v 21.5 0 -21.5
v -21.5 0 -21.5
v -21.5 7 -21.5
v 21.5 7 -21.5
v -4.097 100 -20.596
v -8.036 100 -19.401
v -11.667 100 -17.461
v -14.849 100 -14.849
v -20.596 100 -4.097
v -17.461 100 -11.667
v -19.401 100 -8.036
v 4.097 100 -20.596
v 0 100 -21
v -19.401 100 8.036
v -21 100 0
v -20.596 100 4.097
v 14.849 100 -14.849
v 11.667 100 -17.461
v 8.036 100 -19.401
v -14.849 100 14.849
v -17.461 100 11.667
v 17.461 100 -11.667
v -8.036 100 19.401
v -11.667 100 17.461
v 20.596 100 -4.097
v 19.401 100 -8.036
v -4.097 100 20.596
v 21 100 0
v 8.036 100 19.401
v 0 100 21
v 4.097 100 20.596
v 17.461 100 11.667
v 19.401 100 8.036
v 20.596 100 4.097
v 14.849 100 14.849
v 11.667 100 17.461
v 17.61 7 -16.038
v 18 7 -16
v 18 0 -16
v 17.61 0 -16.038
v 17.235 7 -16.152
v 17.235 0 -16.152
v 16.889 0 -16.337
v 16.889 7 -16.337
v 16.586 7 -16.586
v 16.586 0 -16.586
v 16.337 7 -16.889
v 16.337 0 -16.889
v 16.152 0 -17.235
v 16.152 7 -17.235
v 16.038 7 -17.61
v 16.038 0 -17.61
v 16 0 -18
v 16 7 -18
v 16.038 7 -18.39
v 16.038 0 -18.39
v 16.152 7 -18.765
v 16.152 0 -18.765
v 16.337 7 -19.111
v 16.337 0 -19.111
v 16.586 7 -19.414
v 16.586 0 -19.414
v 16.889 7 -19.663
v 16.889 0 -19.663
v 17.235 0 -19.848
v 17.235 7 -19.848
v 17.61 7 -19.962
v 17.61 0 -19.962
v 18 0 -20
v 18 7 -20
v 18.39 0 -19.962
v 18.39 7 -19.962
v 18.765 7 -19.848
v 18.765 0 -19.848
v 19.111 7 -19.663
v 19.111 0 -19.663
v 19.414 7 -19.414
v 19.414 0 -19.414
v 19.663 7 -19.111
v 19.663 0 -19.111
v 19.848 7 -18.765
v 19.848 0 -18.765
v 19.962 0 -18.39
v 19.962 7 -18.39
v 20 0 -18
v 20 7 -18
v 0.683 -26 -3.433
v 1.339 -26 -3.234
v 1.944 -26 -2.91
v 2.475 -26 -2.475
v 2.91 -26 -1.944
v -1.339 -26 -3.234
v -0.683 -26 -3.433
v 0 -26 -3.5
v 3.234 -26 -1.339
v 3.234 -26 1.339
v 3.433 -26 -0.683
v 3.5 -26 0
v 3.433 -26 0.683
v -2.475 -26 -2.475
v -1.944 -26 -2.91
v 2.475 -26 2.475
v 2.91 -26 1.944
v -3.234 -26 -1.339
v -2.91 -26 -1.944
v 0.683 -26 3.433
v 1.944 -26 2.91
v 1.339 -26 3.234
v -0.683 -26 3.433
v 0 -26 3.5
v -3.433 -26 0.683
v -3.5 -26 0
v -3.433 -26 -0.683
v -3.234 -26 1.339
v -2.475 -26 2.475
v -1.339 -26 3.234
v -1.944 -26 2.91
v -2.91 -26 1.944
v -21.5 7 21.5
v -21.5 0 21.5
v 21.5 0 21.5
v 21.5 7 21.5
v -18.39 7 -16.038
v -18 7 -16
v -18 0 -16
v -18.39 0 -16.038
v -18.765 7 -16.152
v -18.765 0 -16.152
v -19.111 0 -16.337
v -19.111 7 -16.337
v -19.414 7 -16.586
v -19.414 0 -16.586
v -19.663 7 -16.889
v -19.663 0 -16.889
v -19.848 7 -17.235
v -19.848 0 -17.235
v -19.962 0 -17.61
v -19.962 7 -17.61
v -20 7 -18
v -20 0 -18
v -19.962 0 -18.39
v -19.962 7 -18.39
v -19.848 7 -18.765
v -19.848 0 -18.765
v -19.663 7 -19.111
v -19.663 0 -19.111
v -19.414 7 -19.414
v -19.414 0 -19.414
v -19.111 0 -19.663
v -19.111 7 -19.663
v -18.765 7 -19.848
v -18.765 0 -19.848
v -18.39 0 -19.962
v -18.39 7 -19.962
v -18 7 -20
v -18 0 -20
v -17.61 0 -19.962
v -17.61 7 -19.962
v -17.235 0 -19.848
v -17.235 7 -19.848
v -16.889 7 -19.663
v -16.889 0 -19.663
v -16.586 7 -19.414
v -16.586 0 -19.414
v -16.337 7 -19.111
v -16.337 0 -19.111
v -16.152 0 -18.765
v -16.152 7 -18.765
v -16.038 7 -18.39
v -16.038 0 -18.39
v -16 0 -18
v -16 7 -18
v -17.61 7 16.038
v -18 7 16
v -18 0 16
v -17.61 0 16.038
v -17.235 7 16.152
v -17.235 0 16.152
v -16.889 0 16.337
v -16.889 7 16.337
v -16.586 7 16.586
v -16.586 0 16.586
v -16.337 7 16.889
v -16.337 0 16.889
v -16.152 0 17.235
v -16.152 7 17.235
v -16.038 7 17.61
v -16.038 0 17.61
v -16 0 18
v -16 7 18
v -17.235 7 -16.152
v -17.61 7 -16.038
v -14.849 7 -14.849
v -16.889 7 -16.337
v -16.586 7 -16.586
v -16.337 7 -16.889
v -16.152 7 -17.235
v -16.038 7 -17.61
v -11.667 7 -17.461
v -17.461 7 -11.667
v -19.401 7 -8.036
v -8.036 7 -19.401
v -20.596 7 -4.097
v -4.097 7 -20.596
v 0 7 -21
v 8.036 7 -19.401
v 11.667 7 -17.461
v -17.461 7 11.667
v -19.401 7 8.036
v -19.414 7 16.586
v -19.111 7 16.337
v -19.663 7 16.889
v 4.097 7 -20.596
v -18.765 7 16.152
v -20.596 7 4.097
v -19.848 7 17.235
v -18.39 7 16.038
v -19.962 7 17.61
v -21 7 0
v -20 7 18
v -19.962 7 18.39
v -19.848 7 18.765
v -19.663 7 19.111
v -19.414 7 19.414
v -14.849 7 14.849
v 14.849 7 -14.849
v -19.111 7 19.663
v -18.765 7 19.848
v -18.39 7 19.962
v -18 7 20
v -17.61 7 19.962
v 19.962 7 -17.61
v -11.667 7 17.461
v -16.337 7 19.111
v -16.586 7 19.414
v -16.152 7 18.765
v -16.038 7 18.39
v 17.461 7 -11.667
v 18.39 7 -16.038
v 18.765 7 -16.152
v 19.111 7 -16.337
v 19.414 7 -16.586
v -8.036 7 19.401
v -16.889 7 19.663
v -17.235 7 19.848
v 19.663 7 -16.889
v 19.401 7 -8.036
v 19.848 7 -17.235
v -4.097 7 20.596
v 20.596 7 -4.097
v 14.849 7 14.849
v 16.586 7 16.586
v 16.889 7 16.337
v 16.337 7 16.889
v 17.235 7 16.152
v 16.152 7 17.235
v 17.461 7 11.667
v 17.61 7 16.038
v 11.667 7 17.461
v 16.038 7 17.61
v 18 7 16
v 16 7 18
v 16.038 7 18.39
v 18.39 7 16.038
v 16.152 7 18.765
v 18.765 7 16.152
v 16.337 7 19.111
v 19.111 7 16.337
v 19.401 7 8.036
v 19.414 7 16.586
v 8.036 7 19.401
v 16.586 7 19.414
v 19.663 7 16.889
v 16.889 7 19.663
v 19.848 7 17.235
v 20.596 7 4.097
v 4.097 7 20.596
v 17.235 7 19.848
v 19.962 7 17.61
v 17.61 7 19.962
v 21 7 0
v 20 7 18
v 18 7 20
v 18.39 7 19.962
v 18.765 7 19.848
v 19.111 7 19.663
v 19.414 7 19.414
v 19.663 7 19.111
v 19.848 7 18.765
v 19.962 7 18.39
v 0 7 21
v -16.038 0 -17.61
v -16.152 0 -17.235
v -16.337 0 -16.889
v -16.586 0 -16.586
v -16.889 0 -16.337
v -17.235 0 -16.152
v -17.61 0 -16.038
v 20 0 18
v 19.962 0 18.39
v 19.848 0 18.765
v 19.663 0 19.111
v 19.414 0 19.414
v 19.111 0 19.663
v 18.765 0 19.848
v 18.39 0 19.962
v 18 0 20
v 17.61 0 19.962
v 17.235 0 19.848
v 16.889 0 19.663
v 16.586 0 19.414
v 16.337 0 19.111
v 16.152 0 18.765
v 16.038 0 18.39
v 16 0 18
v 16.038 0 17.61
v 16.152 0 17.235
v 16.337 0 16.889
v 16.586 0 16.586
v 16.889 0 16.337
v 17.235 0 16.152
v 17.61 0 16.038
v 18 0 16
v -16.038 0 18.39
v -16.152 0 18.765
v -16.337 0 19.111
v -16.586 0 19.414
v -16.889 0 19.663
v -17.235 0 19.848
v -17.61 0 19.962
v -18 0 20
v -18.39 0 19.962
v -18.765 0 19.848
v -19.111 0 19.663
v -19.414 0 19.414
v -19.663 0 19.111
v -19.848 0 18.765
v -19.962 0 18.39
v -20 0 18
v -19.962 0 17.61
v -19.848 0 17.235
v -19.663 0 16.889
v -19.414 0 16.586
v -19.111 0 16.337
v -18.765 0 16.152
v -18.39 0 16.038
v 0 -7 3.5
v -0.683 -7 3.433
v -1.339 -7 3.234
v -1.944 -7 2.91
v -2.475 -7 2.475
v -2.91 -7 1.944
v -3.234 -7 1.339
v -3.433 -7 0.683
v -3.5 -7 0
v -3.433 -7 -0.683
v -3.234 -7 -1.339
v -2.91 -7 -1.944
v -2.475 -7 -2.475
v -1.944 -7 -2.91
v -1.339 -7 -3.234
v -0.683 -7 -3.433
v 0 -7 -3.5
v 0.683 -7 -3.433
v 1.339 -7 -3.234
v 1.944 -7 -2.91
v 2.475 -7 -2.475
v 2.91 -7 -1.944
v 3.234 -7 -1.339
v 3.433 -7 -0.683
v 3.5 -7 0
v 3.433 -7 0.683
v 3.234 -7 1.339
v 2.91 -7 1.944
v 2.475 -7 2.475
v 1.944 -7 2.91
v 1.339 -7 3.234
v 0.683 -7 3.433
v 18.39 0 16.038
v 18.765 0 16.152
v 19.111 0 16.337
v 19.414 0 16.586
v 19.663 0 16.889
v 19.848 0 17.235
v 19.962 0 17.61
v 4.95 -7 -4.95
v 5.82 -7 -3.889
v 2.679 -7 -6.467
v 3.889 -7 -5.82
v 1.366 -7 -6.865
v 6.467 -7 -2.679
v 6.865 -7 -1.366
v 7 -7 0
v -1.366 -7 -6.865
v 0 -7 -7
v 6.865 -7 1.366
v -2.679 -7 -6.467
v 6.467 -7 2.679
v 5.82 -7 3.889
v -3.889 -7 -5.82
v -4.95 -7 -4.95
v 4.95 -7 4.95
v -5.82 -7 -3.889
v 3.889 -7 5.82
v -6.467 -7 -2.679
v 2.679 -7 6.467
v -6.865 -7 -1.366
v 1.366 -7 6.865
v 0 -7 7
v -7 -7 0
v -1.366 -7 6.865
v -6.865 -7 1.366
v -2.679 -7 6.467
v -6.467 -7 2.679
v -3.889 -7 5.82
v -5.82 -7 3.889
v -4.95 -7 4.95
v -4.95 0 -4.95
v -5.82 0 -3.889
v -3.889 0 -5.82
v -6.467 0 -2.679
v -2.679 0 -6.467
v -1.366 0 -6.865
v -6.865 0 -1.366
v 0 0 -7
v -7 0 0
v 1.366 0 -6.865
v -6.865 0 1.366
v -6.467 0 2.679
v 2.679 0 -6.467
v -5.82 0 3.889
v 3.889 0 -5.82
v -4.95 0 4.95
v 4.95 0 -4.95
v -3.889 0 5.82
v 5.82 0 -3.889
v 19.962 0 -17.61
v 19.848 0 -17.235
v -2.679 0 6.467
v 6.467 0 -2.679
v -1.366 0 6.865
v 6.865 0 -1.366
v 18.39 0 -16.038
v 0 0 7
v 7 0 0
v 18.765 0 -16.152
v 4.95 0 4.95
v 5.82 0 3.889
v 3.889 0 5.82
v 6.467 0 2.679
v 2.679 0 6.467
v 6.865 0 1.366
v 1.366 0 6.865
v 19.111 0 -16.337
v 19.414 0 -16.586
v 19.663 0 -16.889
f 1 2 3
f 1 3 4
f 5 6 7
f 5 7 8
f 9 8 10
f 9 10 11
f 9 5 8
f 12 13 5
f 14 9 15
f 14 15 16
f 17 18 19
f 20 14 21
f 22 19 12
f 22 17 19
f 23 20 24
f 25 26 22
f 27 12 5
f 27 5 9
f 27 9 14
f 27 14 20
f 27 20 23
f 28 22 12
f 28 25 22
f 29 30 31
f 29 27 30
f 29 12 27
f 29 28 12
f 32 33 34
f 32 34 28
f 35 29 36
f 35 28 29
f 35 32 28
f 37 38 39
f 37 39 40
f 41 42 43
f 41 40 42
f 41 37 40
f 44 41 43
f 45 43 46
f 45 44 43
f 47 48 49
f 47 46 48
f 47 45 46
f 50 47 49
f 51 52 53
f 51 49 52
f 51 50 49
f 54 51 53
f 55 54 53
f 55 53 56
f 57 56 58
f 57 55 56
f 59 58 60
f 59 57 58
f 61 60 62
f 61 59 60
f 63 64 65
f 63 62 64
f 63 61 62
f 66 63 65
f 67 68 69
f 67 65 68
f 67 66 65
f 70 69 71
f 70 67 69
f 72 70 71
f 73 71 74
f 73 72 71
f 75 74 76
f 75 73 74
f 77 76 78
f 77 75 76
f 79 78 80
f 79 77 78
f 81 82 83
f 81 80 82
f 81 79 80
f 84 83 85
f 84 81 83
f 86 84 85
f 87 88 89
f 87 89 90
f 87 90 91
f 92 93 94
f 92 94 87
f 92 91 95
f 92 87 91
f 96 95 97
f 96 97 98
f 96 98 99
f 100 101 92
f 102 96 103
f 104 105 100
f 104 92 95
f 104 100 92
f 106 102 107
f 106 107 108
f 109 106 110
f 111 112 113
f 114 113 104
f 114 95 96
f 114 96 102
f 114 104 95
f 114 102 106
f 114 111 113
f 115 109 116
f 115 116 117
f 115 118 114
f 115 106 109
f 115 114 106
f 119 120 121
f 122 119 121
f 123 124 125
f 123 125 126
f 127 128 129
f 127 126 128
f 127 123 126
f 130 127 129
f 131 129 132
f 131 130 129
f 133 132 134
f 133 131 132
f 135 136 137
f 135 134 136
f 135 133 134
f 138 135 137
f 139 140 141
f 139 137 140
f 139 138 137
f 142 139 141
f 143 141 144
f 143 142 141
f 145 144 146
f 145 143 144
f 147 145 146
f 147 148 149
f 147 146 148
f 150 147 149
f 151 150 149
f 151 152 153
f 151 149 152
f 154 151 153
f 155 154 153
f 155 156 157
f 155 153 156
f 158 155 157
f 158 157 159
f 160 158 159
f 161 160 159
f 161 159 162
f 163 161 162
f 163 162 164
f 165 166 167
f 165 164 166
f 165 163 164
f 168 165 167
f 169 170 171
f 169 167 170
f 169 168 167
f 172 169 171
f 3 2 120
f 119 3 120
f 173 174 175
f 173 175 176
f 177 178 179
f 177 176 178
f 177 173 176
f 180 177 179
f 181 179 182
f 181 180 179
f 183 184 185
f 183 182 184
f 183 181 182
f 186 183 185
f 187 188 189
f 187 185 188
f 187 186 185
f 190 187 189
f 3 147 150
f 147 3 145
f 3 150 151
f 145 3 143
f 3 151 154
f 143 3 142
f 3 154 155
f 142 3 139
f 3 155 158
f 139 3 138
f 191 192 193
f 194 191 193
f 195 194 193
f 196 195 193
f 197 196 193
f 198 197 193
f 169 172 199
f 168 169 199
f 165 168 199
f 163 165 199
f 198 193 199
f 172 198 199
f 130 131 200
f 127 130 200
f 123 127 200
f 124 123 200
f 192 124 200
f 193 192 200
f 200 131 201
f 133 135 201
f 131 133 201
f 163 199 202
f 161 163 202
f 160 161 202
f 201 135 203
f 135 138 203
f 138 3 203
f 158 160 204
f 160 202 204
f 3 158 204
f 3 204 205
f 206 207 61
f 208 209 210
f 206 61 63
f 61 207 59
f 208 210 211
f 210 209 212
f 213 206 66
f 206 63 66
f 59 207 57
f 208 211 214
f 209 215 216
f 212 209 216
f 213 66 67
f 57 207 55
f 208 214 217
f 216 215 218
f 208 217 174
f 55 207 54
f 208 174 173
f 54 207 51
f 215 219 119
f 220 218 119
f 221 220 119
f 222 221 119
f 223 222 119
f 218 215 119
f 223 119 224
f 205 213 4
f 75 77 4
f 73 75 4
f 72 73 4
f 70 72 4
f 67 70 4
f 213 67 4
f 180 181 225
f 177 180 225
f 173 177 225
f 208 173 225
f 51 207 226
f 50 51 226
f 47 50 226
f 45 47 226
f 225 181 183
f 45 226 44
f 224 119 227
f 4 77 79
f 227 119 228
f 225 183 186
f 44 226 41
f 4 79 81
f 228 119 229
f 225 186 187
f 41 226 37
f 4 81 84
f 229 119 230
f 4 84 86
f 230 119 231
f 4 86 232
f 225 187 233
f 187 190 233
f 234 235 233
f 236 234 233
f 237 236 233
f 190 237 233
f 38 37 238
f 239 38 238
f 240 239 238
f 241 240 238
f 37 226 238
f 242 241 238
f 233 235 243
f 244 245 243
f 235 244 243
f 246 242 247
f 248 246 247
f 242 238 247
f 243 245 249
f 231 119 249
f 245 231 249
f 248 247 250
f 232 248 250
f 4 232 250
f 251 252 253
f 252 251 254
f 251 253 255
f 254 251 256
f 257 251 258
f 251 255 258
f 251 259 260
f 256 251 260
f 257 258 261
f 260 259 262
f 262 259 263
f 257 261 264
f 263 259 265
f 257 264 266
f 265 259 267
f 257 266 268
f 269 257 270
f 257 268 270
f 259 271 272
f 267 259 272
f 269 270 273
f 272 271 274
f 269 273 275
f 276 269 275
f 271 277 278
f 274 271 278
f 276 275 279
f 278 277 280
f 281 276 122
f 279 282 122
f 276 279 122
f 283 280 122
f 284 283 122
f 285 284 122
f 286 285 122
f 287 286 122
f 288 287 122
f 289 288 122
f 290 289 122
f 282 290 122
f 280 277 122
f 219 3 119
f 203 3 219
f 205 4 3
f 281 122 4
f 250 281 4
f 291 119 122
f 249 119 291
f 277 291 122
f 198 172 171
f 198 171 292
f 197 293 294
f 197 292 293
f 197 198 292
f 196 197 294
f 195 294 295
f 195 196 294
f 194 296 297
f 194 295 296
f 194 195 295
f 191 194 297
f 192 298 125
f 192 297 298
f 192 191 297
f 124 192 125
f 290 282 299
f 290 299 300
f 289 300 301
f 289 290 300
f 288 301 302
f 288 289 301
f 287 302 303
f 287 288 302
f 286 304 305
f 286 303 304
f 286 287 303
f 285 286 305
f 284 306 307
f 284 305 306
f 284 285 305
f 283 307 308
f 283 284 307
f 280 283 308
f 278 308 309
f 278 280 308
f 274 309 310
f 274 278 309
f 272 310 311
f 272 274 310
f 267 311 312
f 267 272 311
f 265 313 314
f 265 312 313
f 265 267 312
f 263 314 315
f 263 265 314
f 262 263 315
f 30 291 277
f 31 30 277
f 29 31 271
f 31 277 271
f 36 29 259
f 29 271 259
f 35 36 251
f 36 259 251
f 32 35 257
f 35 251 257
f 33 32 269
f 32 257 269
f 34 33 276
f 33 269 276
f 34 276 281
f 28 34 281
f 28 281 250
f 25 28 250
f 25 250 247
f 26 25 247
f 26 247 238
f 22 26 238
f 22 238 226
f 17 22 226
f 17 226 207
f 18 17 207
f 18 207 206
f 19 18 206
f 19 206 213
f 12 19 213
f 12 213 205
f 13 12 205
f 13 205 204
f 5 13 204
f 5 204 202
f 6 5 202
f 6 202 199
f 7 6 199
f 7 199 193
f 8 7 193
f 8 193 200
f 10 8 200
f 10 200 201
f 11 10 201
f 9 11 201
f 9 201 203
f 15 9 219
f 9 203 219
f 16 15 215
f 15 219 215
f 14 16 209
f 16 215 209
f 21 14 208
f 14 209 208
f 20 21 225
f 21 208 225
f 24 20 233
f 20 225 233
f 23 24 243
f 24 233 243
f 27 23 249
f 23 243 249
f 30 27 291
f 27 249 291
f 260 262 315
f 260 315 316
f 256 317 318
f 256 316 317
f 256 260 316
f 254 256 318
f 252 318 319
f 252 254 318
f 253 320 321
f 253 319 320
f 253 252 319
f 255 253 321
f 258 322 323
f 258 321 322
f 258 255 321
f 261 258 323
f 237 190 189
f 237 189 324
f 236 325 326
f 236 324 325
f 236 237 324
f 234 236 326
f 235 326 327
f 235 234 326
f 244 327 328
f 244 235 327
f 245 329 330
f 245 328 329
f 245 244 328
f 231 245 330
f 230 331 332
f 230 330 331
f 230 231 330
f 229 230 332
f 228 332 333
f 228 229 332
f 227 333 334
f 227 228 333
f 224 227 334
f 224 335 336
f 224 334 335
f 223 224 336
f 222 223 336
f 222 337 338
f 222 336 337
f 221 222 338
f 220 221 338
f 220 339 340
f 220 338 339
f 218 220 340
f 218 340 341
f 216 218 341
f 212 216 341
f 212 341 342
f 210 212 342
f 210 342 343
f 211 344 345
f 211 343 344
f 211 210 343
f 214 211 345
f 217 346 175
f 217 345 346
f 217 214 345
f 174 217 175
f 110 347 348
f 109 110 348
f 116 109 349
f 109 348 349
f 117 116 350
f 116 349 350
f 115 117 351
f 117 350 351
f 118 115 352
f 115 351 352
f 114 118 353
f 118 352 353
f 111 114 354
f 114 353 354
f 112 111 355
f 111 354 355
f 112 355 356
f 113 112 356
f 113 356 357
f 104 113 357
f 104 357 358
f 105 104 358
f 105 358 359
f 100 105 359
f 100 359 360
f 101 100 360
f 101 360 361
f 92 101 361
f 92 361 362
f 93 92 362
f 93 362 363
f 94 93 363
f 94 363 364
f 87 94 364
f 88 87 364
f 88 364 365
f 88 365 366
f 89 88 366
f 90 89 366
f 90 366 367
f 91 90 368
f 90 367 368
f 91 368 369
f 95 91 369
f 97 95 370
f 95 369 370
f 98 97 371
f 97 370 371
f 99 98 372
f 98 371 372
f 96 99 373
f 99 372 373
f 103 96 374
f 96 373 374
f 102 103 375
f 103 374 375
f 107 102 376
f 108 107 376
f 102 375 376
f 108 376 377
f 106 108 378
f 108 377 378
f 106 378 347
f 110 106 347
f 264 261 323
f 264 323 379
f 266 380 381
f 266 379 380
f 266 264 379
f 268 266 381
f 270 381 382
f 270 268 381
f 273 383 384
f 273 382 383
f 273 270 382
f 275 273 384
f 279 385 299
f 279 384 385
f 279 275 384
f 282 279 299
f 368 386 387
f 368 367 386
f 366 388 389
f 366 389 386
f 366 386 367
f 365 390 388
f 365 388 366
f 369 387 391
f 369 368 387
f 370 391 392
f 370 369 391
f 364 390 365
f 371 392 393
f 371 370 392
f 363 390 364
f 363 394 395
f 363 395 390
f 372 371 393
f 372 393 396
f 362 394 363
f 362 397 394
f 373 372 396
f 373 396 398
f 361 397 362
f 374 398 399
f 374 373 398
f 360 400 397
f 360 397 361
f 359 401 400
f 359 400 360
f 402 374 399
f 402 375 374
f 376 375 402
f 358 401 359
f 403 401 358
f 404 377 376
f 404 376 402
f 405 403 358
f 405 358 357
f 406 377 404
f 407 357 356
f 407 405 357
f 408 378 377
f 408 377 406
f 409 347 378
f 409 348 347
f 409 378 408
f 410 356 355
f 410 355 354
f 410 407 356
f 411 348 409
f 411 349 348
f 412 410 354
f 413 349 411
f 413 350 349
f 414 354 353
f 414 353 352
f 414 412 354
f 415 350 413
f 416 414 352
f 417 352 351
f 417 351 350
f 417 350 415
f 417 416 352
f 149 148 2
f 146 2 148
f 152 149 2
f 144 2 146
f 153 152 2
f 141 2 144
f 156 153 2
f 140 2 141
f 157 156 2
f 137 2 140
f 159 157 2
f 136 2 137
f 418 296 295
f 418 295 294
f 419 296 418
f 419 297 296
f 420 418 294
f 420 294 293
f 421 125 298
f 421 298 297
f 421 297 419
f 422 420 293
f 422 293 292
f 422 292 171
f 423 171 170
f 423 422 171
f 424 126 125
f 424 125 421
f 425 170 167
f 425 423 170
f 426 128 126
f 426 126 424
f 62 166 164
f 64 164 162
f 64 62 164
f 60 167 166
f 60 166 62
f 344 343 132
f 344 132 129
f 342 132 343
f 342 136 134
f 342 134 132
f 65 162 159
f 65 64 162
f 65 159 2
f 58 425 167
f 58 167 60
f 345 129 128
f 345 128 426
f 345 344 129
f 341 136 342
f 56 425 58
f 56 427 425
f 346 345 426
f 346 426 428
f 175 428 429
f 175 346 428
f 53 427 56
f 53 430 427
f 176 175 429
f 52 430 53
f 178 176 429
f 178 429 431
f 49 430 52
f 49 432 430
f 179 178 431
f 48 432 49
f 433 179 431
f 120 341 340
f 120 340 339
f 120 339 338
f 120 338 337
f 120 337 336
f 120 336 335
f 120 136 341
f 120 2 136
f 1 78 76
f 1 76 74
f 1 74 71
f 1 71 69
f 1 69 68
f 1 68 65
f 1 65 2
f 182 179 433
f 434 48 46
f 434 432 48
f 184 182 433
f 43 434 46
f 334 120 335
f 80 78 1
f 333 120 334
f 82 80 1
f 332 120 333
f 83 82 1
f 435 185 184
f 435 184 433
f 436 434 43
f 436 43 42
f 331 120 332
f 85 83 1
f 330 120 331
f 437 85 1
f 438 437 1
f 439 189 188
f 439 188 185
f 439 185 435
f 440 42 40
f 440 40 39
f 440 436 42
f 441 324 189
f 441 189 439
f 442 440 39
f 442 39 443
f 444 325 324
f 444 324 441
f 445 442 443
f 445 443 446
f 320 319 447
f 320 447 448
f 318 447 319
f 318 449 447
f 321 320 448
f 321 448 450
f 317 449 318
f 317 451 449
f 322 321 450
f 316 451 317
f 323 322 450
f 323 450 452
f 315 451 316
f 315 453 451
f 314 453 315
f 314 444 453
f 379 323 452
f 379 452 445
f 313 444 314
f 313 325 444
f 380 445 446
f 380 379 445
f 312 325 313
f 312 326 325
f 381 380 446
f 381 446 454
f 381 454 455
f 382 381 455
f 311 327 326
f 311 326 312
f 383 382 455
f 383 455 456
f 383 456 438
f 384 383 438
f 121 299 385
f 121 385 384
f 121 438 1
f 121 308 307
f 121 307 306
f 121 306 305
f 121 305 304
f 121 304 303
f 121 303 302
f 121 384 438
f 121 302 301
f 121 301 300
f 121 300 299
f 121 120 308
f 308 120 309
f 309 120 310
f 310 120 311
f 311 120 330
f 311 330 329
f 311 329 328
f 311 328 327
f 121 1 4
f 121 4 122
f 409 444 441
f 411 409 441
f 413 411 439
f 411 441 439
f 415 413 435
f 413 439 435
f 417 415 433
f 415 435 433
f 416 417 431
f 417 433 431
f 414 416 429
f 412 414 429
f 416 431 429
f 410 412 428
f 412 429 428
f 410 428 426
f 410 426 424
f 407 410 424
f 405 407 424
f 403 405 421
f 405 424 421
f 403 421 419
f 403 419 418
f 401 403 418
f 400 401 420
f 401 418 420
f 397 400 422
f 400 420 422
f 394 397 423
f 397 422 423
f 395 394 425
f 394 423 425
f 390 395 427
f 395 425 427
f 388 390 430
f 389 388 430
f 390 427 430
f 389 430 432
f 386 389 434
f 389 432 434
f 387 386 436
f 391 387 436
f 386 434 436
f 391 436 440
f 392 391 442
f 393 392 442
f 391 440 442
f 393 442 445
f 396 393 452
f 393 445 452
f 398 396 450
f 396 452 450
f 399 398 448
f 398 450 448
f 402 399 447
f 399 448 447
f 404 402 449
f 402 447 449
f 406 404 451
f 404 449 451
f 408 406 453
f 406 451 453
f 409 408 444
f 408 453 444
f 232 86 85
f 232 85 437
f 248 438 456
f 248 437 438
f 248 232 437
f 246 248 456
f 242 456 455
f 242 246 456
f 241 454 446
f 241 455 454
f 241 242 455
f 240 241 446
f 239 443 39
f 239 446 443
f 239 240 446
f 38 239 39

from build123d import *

# Parameters (mm, degrees)
SKETCH1_R               = 21
BOSS_EXTRUDE1_DEPTH     = 100
SKETCH3_R               = 3.5
BOSS_EXTRUDE3_DEPTH     = 26
SKETCH4_R               = 7
BOSS_EXTRUDE4_DEPTH     = 7
SKETCH5_W               = 43
SKETCH5_H               = 43
BOSS_EXTRUDE5_DEPTH     = 7
CUT_EXTRUDE1_DEPTH      = 105.52033295
CUT_EXTRUDE1_DEPTH_BACK = 105.52033295


with BuildPart() as part:
    # Sketch1 → Boss-Extrude1 (new body)
    with BuildSketch(Plane(origin=(0, 0, 0), x_dir=(1, 0, 0), z_dir=(0, 1, 0))):
        with Locations(Location((0, 0, 0), (0, 0, 270))):
            Circle(SKETCH1_R)
    extrude(amount=BOSS_EXTRUDE1_DEPTH)

    # Sketch3 → Boss-Extrude3 (add)
    with BuildSketch(Plane.XZ):
        with Locations(Location((0, 0, 0), (0, 0, 90))):
            Circle(SKETCH3_R)
    extrude(amount=BOSS_EXTRUDE3_DEPTH)

    # Sketch4 → Boss-Extrude4 (add)
    with BuildSketch(Plane.XZ):
        with Locations(Location((0, 0, 0), (0, 0, 90))):
            Circle(SKETCH4_R)
    extrude(amount=BOSS_EXTRUDE4_DEPTH)

    # Sketch5 → Boss-Extrude5 (add)
    with BuildSketch(Plane.XZ):
        Rectangle(SKETCH5_W, SKETCH5_H)
    extrude(amount=-BOSS_EXTRUDE5_DEPTH)

    # Sketch6 → Cut-Extrude1 (cut, two sides: drawn at the far end of the back side and taken through both)
    with BuildSketch(Plane.XZ.offset(-CUT_EXTRUDE1_DEPTH_BACK)):
        with BuildLine():
            ThreePointArc((-16, 18), (-19.414213562, 19.414213562), (-18, 16))
            Line((-18, 16), (-18, 18))
            Line((-18, 18), (-16, 18))
        make_face()
        with BuildLine():
            Line((-18, 18), (-18, 16))
            ThreePointArc((-18, 16), (-16.585786438, 16.585786438), (-16, 18))
            Line((-16, 18), (-18, 18))
        make_face()
        with BuildLine():
            Line((-18, -16), (-18, -18))
            Line((-18, -18), (-16, -18))
            ThreePointArc((-16, -18), (-16.585786438, -16.585786438), (-18, -16))
        make_face()
        with BuildLine():
            Line((-16, -18), (-18, -18))
            Line((-18, -18), (-18, -16))
            ThreePointArc((-18, -16), (-19.414213562, -19.414213562), (-16, -18))
        make_face()
        with BuildLine():
            ThreePointArc((18, -16), (16.585786438, -16.585786438), (16, -18))
            Line((16, -18), (18, -18))
            Line((18, -18), (18, -16))
        make_face()
        with BuildLine():
            Line((18, -18), (16, -18))
            ThreePointArc((16, -18), (18, -20), (20, -18))
            ThreePointArc((20, -18), (19.414213562, -16.585786438), (18, -16))
            Line((18, -16), (18, -18))
        make_face()
        with BuildLine():
            ThreePointArc((16, 18), (16.585786438, 16.585786438), (18, 16))
            Line((18, 16), (18, 18))
            Line((18, 18), (16, 18))
        make_face()
        with BuildLine():
            Line((18, 18), (18, 16))
            ThreePointArc((18, 16), (19.414213562, 16.585786438), (20, 18))
            ThreePointArc((20, 18), (18, 20), (16, 18))
            Line((16, 18), (18, 18))
        make_face()
    extrude(amount=CUT_EXTRUDE1_DEPTH + CUT_EXTRUDE1_DEPTH_BACK, mode=Mode.SUBTRACT)


solid = part.part
